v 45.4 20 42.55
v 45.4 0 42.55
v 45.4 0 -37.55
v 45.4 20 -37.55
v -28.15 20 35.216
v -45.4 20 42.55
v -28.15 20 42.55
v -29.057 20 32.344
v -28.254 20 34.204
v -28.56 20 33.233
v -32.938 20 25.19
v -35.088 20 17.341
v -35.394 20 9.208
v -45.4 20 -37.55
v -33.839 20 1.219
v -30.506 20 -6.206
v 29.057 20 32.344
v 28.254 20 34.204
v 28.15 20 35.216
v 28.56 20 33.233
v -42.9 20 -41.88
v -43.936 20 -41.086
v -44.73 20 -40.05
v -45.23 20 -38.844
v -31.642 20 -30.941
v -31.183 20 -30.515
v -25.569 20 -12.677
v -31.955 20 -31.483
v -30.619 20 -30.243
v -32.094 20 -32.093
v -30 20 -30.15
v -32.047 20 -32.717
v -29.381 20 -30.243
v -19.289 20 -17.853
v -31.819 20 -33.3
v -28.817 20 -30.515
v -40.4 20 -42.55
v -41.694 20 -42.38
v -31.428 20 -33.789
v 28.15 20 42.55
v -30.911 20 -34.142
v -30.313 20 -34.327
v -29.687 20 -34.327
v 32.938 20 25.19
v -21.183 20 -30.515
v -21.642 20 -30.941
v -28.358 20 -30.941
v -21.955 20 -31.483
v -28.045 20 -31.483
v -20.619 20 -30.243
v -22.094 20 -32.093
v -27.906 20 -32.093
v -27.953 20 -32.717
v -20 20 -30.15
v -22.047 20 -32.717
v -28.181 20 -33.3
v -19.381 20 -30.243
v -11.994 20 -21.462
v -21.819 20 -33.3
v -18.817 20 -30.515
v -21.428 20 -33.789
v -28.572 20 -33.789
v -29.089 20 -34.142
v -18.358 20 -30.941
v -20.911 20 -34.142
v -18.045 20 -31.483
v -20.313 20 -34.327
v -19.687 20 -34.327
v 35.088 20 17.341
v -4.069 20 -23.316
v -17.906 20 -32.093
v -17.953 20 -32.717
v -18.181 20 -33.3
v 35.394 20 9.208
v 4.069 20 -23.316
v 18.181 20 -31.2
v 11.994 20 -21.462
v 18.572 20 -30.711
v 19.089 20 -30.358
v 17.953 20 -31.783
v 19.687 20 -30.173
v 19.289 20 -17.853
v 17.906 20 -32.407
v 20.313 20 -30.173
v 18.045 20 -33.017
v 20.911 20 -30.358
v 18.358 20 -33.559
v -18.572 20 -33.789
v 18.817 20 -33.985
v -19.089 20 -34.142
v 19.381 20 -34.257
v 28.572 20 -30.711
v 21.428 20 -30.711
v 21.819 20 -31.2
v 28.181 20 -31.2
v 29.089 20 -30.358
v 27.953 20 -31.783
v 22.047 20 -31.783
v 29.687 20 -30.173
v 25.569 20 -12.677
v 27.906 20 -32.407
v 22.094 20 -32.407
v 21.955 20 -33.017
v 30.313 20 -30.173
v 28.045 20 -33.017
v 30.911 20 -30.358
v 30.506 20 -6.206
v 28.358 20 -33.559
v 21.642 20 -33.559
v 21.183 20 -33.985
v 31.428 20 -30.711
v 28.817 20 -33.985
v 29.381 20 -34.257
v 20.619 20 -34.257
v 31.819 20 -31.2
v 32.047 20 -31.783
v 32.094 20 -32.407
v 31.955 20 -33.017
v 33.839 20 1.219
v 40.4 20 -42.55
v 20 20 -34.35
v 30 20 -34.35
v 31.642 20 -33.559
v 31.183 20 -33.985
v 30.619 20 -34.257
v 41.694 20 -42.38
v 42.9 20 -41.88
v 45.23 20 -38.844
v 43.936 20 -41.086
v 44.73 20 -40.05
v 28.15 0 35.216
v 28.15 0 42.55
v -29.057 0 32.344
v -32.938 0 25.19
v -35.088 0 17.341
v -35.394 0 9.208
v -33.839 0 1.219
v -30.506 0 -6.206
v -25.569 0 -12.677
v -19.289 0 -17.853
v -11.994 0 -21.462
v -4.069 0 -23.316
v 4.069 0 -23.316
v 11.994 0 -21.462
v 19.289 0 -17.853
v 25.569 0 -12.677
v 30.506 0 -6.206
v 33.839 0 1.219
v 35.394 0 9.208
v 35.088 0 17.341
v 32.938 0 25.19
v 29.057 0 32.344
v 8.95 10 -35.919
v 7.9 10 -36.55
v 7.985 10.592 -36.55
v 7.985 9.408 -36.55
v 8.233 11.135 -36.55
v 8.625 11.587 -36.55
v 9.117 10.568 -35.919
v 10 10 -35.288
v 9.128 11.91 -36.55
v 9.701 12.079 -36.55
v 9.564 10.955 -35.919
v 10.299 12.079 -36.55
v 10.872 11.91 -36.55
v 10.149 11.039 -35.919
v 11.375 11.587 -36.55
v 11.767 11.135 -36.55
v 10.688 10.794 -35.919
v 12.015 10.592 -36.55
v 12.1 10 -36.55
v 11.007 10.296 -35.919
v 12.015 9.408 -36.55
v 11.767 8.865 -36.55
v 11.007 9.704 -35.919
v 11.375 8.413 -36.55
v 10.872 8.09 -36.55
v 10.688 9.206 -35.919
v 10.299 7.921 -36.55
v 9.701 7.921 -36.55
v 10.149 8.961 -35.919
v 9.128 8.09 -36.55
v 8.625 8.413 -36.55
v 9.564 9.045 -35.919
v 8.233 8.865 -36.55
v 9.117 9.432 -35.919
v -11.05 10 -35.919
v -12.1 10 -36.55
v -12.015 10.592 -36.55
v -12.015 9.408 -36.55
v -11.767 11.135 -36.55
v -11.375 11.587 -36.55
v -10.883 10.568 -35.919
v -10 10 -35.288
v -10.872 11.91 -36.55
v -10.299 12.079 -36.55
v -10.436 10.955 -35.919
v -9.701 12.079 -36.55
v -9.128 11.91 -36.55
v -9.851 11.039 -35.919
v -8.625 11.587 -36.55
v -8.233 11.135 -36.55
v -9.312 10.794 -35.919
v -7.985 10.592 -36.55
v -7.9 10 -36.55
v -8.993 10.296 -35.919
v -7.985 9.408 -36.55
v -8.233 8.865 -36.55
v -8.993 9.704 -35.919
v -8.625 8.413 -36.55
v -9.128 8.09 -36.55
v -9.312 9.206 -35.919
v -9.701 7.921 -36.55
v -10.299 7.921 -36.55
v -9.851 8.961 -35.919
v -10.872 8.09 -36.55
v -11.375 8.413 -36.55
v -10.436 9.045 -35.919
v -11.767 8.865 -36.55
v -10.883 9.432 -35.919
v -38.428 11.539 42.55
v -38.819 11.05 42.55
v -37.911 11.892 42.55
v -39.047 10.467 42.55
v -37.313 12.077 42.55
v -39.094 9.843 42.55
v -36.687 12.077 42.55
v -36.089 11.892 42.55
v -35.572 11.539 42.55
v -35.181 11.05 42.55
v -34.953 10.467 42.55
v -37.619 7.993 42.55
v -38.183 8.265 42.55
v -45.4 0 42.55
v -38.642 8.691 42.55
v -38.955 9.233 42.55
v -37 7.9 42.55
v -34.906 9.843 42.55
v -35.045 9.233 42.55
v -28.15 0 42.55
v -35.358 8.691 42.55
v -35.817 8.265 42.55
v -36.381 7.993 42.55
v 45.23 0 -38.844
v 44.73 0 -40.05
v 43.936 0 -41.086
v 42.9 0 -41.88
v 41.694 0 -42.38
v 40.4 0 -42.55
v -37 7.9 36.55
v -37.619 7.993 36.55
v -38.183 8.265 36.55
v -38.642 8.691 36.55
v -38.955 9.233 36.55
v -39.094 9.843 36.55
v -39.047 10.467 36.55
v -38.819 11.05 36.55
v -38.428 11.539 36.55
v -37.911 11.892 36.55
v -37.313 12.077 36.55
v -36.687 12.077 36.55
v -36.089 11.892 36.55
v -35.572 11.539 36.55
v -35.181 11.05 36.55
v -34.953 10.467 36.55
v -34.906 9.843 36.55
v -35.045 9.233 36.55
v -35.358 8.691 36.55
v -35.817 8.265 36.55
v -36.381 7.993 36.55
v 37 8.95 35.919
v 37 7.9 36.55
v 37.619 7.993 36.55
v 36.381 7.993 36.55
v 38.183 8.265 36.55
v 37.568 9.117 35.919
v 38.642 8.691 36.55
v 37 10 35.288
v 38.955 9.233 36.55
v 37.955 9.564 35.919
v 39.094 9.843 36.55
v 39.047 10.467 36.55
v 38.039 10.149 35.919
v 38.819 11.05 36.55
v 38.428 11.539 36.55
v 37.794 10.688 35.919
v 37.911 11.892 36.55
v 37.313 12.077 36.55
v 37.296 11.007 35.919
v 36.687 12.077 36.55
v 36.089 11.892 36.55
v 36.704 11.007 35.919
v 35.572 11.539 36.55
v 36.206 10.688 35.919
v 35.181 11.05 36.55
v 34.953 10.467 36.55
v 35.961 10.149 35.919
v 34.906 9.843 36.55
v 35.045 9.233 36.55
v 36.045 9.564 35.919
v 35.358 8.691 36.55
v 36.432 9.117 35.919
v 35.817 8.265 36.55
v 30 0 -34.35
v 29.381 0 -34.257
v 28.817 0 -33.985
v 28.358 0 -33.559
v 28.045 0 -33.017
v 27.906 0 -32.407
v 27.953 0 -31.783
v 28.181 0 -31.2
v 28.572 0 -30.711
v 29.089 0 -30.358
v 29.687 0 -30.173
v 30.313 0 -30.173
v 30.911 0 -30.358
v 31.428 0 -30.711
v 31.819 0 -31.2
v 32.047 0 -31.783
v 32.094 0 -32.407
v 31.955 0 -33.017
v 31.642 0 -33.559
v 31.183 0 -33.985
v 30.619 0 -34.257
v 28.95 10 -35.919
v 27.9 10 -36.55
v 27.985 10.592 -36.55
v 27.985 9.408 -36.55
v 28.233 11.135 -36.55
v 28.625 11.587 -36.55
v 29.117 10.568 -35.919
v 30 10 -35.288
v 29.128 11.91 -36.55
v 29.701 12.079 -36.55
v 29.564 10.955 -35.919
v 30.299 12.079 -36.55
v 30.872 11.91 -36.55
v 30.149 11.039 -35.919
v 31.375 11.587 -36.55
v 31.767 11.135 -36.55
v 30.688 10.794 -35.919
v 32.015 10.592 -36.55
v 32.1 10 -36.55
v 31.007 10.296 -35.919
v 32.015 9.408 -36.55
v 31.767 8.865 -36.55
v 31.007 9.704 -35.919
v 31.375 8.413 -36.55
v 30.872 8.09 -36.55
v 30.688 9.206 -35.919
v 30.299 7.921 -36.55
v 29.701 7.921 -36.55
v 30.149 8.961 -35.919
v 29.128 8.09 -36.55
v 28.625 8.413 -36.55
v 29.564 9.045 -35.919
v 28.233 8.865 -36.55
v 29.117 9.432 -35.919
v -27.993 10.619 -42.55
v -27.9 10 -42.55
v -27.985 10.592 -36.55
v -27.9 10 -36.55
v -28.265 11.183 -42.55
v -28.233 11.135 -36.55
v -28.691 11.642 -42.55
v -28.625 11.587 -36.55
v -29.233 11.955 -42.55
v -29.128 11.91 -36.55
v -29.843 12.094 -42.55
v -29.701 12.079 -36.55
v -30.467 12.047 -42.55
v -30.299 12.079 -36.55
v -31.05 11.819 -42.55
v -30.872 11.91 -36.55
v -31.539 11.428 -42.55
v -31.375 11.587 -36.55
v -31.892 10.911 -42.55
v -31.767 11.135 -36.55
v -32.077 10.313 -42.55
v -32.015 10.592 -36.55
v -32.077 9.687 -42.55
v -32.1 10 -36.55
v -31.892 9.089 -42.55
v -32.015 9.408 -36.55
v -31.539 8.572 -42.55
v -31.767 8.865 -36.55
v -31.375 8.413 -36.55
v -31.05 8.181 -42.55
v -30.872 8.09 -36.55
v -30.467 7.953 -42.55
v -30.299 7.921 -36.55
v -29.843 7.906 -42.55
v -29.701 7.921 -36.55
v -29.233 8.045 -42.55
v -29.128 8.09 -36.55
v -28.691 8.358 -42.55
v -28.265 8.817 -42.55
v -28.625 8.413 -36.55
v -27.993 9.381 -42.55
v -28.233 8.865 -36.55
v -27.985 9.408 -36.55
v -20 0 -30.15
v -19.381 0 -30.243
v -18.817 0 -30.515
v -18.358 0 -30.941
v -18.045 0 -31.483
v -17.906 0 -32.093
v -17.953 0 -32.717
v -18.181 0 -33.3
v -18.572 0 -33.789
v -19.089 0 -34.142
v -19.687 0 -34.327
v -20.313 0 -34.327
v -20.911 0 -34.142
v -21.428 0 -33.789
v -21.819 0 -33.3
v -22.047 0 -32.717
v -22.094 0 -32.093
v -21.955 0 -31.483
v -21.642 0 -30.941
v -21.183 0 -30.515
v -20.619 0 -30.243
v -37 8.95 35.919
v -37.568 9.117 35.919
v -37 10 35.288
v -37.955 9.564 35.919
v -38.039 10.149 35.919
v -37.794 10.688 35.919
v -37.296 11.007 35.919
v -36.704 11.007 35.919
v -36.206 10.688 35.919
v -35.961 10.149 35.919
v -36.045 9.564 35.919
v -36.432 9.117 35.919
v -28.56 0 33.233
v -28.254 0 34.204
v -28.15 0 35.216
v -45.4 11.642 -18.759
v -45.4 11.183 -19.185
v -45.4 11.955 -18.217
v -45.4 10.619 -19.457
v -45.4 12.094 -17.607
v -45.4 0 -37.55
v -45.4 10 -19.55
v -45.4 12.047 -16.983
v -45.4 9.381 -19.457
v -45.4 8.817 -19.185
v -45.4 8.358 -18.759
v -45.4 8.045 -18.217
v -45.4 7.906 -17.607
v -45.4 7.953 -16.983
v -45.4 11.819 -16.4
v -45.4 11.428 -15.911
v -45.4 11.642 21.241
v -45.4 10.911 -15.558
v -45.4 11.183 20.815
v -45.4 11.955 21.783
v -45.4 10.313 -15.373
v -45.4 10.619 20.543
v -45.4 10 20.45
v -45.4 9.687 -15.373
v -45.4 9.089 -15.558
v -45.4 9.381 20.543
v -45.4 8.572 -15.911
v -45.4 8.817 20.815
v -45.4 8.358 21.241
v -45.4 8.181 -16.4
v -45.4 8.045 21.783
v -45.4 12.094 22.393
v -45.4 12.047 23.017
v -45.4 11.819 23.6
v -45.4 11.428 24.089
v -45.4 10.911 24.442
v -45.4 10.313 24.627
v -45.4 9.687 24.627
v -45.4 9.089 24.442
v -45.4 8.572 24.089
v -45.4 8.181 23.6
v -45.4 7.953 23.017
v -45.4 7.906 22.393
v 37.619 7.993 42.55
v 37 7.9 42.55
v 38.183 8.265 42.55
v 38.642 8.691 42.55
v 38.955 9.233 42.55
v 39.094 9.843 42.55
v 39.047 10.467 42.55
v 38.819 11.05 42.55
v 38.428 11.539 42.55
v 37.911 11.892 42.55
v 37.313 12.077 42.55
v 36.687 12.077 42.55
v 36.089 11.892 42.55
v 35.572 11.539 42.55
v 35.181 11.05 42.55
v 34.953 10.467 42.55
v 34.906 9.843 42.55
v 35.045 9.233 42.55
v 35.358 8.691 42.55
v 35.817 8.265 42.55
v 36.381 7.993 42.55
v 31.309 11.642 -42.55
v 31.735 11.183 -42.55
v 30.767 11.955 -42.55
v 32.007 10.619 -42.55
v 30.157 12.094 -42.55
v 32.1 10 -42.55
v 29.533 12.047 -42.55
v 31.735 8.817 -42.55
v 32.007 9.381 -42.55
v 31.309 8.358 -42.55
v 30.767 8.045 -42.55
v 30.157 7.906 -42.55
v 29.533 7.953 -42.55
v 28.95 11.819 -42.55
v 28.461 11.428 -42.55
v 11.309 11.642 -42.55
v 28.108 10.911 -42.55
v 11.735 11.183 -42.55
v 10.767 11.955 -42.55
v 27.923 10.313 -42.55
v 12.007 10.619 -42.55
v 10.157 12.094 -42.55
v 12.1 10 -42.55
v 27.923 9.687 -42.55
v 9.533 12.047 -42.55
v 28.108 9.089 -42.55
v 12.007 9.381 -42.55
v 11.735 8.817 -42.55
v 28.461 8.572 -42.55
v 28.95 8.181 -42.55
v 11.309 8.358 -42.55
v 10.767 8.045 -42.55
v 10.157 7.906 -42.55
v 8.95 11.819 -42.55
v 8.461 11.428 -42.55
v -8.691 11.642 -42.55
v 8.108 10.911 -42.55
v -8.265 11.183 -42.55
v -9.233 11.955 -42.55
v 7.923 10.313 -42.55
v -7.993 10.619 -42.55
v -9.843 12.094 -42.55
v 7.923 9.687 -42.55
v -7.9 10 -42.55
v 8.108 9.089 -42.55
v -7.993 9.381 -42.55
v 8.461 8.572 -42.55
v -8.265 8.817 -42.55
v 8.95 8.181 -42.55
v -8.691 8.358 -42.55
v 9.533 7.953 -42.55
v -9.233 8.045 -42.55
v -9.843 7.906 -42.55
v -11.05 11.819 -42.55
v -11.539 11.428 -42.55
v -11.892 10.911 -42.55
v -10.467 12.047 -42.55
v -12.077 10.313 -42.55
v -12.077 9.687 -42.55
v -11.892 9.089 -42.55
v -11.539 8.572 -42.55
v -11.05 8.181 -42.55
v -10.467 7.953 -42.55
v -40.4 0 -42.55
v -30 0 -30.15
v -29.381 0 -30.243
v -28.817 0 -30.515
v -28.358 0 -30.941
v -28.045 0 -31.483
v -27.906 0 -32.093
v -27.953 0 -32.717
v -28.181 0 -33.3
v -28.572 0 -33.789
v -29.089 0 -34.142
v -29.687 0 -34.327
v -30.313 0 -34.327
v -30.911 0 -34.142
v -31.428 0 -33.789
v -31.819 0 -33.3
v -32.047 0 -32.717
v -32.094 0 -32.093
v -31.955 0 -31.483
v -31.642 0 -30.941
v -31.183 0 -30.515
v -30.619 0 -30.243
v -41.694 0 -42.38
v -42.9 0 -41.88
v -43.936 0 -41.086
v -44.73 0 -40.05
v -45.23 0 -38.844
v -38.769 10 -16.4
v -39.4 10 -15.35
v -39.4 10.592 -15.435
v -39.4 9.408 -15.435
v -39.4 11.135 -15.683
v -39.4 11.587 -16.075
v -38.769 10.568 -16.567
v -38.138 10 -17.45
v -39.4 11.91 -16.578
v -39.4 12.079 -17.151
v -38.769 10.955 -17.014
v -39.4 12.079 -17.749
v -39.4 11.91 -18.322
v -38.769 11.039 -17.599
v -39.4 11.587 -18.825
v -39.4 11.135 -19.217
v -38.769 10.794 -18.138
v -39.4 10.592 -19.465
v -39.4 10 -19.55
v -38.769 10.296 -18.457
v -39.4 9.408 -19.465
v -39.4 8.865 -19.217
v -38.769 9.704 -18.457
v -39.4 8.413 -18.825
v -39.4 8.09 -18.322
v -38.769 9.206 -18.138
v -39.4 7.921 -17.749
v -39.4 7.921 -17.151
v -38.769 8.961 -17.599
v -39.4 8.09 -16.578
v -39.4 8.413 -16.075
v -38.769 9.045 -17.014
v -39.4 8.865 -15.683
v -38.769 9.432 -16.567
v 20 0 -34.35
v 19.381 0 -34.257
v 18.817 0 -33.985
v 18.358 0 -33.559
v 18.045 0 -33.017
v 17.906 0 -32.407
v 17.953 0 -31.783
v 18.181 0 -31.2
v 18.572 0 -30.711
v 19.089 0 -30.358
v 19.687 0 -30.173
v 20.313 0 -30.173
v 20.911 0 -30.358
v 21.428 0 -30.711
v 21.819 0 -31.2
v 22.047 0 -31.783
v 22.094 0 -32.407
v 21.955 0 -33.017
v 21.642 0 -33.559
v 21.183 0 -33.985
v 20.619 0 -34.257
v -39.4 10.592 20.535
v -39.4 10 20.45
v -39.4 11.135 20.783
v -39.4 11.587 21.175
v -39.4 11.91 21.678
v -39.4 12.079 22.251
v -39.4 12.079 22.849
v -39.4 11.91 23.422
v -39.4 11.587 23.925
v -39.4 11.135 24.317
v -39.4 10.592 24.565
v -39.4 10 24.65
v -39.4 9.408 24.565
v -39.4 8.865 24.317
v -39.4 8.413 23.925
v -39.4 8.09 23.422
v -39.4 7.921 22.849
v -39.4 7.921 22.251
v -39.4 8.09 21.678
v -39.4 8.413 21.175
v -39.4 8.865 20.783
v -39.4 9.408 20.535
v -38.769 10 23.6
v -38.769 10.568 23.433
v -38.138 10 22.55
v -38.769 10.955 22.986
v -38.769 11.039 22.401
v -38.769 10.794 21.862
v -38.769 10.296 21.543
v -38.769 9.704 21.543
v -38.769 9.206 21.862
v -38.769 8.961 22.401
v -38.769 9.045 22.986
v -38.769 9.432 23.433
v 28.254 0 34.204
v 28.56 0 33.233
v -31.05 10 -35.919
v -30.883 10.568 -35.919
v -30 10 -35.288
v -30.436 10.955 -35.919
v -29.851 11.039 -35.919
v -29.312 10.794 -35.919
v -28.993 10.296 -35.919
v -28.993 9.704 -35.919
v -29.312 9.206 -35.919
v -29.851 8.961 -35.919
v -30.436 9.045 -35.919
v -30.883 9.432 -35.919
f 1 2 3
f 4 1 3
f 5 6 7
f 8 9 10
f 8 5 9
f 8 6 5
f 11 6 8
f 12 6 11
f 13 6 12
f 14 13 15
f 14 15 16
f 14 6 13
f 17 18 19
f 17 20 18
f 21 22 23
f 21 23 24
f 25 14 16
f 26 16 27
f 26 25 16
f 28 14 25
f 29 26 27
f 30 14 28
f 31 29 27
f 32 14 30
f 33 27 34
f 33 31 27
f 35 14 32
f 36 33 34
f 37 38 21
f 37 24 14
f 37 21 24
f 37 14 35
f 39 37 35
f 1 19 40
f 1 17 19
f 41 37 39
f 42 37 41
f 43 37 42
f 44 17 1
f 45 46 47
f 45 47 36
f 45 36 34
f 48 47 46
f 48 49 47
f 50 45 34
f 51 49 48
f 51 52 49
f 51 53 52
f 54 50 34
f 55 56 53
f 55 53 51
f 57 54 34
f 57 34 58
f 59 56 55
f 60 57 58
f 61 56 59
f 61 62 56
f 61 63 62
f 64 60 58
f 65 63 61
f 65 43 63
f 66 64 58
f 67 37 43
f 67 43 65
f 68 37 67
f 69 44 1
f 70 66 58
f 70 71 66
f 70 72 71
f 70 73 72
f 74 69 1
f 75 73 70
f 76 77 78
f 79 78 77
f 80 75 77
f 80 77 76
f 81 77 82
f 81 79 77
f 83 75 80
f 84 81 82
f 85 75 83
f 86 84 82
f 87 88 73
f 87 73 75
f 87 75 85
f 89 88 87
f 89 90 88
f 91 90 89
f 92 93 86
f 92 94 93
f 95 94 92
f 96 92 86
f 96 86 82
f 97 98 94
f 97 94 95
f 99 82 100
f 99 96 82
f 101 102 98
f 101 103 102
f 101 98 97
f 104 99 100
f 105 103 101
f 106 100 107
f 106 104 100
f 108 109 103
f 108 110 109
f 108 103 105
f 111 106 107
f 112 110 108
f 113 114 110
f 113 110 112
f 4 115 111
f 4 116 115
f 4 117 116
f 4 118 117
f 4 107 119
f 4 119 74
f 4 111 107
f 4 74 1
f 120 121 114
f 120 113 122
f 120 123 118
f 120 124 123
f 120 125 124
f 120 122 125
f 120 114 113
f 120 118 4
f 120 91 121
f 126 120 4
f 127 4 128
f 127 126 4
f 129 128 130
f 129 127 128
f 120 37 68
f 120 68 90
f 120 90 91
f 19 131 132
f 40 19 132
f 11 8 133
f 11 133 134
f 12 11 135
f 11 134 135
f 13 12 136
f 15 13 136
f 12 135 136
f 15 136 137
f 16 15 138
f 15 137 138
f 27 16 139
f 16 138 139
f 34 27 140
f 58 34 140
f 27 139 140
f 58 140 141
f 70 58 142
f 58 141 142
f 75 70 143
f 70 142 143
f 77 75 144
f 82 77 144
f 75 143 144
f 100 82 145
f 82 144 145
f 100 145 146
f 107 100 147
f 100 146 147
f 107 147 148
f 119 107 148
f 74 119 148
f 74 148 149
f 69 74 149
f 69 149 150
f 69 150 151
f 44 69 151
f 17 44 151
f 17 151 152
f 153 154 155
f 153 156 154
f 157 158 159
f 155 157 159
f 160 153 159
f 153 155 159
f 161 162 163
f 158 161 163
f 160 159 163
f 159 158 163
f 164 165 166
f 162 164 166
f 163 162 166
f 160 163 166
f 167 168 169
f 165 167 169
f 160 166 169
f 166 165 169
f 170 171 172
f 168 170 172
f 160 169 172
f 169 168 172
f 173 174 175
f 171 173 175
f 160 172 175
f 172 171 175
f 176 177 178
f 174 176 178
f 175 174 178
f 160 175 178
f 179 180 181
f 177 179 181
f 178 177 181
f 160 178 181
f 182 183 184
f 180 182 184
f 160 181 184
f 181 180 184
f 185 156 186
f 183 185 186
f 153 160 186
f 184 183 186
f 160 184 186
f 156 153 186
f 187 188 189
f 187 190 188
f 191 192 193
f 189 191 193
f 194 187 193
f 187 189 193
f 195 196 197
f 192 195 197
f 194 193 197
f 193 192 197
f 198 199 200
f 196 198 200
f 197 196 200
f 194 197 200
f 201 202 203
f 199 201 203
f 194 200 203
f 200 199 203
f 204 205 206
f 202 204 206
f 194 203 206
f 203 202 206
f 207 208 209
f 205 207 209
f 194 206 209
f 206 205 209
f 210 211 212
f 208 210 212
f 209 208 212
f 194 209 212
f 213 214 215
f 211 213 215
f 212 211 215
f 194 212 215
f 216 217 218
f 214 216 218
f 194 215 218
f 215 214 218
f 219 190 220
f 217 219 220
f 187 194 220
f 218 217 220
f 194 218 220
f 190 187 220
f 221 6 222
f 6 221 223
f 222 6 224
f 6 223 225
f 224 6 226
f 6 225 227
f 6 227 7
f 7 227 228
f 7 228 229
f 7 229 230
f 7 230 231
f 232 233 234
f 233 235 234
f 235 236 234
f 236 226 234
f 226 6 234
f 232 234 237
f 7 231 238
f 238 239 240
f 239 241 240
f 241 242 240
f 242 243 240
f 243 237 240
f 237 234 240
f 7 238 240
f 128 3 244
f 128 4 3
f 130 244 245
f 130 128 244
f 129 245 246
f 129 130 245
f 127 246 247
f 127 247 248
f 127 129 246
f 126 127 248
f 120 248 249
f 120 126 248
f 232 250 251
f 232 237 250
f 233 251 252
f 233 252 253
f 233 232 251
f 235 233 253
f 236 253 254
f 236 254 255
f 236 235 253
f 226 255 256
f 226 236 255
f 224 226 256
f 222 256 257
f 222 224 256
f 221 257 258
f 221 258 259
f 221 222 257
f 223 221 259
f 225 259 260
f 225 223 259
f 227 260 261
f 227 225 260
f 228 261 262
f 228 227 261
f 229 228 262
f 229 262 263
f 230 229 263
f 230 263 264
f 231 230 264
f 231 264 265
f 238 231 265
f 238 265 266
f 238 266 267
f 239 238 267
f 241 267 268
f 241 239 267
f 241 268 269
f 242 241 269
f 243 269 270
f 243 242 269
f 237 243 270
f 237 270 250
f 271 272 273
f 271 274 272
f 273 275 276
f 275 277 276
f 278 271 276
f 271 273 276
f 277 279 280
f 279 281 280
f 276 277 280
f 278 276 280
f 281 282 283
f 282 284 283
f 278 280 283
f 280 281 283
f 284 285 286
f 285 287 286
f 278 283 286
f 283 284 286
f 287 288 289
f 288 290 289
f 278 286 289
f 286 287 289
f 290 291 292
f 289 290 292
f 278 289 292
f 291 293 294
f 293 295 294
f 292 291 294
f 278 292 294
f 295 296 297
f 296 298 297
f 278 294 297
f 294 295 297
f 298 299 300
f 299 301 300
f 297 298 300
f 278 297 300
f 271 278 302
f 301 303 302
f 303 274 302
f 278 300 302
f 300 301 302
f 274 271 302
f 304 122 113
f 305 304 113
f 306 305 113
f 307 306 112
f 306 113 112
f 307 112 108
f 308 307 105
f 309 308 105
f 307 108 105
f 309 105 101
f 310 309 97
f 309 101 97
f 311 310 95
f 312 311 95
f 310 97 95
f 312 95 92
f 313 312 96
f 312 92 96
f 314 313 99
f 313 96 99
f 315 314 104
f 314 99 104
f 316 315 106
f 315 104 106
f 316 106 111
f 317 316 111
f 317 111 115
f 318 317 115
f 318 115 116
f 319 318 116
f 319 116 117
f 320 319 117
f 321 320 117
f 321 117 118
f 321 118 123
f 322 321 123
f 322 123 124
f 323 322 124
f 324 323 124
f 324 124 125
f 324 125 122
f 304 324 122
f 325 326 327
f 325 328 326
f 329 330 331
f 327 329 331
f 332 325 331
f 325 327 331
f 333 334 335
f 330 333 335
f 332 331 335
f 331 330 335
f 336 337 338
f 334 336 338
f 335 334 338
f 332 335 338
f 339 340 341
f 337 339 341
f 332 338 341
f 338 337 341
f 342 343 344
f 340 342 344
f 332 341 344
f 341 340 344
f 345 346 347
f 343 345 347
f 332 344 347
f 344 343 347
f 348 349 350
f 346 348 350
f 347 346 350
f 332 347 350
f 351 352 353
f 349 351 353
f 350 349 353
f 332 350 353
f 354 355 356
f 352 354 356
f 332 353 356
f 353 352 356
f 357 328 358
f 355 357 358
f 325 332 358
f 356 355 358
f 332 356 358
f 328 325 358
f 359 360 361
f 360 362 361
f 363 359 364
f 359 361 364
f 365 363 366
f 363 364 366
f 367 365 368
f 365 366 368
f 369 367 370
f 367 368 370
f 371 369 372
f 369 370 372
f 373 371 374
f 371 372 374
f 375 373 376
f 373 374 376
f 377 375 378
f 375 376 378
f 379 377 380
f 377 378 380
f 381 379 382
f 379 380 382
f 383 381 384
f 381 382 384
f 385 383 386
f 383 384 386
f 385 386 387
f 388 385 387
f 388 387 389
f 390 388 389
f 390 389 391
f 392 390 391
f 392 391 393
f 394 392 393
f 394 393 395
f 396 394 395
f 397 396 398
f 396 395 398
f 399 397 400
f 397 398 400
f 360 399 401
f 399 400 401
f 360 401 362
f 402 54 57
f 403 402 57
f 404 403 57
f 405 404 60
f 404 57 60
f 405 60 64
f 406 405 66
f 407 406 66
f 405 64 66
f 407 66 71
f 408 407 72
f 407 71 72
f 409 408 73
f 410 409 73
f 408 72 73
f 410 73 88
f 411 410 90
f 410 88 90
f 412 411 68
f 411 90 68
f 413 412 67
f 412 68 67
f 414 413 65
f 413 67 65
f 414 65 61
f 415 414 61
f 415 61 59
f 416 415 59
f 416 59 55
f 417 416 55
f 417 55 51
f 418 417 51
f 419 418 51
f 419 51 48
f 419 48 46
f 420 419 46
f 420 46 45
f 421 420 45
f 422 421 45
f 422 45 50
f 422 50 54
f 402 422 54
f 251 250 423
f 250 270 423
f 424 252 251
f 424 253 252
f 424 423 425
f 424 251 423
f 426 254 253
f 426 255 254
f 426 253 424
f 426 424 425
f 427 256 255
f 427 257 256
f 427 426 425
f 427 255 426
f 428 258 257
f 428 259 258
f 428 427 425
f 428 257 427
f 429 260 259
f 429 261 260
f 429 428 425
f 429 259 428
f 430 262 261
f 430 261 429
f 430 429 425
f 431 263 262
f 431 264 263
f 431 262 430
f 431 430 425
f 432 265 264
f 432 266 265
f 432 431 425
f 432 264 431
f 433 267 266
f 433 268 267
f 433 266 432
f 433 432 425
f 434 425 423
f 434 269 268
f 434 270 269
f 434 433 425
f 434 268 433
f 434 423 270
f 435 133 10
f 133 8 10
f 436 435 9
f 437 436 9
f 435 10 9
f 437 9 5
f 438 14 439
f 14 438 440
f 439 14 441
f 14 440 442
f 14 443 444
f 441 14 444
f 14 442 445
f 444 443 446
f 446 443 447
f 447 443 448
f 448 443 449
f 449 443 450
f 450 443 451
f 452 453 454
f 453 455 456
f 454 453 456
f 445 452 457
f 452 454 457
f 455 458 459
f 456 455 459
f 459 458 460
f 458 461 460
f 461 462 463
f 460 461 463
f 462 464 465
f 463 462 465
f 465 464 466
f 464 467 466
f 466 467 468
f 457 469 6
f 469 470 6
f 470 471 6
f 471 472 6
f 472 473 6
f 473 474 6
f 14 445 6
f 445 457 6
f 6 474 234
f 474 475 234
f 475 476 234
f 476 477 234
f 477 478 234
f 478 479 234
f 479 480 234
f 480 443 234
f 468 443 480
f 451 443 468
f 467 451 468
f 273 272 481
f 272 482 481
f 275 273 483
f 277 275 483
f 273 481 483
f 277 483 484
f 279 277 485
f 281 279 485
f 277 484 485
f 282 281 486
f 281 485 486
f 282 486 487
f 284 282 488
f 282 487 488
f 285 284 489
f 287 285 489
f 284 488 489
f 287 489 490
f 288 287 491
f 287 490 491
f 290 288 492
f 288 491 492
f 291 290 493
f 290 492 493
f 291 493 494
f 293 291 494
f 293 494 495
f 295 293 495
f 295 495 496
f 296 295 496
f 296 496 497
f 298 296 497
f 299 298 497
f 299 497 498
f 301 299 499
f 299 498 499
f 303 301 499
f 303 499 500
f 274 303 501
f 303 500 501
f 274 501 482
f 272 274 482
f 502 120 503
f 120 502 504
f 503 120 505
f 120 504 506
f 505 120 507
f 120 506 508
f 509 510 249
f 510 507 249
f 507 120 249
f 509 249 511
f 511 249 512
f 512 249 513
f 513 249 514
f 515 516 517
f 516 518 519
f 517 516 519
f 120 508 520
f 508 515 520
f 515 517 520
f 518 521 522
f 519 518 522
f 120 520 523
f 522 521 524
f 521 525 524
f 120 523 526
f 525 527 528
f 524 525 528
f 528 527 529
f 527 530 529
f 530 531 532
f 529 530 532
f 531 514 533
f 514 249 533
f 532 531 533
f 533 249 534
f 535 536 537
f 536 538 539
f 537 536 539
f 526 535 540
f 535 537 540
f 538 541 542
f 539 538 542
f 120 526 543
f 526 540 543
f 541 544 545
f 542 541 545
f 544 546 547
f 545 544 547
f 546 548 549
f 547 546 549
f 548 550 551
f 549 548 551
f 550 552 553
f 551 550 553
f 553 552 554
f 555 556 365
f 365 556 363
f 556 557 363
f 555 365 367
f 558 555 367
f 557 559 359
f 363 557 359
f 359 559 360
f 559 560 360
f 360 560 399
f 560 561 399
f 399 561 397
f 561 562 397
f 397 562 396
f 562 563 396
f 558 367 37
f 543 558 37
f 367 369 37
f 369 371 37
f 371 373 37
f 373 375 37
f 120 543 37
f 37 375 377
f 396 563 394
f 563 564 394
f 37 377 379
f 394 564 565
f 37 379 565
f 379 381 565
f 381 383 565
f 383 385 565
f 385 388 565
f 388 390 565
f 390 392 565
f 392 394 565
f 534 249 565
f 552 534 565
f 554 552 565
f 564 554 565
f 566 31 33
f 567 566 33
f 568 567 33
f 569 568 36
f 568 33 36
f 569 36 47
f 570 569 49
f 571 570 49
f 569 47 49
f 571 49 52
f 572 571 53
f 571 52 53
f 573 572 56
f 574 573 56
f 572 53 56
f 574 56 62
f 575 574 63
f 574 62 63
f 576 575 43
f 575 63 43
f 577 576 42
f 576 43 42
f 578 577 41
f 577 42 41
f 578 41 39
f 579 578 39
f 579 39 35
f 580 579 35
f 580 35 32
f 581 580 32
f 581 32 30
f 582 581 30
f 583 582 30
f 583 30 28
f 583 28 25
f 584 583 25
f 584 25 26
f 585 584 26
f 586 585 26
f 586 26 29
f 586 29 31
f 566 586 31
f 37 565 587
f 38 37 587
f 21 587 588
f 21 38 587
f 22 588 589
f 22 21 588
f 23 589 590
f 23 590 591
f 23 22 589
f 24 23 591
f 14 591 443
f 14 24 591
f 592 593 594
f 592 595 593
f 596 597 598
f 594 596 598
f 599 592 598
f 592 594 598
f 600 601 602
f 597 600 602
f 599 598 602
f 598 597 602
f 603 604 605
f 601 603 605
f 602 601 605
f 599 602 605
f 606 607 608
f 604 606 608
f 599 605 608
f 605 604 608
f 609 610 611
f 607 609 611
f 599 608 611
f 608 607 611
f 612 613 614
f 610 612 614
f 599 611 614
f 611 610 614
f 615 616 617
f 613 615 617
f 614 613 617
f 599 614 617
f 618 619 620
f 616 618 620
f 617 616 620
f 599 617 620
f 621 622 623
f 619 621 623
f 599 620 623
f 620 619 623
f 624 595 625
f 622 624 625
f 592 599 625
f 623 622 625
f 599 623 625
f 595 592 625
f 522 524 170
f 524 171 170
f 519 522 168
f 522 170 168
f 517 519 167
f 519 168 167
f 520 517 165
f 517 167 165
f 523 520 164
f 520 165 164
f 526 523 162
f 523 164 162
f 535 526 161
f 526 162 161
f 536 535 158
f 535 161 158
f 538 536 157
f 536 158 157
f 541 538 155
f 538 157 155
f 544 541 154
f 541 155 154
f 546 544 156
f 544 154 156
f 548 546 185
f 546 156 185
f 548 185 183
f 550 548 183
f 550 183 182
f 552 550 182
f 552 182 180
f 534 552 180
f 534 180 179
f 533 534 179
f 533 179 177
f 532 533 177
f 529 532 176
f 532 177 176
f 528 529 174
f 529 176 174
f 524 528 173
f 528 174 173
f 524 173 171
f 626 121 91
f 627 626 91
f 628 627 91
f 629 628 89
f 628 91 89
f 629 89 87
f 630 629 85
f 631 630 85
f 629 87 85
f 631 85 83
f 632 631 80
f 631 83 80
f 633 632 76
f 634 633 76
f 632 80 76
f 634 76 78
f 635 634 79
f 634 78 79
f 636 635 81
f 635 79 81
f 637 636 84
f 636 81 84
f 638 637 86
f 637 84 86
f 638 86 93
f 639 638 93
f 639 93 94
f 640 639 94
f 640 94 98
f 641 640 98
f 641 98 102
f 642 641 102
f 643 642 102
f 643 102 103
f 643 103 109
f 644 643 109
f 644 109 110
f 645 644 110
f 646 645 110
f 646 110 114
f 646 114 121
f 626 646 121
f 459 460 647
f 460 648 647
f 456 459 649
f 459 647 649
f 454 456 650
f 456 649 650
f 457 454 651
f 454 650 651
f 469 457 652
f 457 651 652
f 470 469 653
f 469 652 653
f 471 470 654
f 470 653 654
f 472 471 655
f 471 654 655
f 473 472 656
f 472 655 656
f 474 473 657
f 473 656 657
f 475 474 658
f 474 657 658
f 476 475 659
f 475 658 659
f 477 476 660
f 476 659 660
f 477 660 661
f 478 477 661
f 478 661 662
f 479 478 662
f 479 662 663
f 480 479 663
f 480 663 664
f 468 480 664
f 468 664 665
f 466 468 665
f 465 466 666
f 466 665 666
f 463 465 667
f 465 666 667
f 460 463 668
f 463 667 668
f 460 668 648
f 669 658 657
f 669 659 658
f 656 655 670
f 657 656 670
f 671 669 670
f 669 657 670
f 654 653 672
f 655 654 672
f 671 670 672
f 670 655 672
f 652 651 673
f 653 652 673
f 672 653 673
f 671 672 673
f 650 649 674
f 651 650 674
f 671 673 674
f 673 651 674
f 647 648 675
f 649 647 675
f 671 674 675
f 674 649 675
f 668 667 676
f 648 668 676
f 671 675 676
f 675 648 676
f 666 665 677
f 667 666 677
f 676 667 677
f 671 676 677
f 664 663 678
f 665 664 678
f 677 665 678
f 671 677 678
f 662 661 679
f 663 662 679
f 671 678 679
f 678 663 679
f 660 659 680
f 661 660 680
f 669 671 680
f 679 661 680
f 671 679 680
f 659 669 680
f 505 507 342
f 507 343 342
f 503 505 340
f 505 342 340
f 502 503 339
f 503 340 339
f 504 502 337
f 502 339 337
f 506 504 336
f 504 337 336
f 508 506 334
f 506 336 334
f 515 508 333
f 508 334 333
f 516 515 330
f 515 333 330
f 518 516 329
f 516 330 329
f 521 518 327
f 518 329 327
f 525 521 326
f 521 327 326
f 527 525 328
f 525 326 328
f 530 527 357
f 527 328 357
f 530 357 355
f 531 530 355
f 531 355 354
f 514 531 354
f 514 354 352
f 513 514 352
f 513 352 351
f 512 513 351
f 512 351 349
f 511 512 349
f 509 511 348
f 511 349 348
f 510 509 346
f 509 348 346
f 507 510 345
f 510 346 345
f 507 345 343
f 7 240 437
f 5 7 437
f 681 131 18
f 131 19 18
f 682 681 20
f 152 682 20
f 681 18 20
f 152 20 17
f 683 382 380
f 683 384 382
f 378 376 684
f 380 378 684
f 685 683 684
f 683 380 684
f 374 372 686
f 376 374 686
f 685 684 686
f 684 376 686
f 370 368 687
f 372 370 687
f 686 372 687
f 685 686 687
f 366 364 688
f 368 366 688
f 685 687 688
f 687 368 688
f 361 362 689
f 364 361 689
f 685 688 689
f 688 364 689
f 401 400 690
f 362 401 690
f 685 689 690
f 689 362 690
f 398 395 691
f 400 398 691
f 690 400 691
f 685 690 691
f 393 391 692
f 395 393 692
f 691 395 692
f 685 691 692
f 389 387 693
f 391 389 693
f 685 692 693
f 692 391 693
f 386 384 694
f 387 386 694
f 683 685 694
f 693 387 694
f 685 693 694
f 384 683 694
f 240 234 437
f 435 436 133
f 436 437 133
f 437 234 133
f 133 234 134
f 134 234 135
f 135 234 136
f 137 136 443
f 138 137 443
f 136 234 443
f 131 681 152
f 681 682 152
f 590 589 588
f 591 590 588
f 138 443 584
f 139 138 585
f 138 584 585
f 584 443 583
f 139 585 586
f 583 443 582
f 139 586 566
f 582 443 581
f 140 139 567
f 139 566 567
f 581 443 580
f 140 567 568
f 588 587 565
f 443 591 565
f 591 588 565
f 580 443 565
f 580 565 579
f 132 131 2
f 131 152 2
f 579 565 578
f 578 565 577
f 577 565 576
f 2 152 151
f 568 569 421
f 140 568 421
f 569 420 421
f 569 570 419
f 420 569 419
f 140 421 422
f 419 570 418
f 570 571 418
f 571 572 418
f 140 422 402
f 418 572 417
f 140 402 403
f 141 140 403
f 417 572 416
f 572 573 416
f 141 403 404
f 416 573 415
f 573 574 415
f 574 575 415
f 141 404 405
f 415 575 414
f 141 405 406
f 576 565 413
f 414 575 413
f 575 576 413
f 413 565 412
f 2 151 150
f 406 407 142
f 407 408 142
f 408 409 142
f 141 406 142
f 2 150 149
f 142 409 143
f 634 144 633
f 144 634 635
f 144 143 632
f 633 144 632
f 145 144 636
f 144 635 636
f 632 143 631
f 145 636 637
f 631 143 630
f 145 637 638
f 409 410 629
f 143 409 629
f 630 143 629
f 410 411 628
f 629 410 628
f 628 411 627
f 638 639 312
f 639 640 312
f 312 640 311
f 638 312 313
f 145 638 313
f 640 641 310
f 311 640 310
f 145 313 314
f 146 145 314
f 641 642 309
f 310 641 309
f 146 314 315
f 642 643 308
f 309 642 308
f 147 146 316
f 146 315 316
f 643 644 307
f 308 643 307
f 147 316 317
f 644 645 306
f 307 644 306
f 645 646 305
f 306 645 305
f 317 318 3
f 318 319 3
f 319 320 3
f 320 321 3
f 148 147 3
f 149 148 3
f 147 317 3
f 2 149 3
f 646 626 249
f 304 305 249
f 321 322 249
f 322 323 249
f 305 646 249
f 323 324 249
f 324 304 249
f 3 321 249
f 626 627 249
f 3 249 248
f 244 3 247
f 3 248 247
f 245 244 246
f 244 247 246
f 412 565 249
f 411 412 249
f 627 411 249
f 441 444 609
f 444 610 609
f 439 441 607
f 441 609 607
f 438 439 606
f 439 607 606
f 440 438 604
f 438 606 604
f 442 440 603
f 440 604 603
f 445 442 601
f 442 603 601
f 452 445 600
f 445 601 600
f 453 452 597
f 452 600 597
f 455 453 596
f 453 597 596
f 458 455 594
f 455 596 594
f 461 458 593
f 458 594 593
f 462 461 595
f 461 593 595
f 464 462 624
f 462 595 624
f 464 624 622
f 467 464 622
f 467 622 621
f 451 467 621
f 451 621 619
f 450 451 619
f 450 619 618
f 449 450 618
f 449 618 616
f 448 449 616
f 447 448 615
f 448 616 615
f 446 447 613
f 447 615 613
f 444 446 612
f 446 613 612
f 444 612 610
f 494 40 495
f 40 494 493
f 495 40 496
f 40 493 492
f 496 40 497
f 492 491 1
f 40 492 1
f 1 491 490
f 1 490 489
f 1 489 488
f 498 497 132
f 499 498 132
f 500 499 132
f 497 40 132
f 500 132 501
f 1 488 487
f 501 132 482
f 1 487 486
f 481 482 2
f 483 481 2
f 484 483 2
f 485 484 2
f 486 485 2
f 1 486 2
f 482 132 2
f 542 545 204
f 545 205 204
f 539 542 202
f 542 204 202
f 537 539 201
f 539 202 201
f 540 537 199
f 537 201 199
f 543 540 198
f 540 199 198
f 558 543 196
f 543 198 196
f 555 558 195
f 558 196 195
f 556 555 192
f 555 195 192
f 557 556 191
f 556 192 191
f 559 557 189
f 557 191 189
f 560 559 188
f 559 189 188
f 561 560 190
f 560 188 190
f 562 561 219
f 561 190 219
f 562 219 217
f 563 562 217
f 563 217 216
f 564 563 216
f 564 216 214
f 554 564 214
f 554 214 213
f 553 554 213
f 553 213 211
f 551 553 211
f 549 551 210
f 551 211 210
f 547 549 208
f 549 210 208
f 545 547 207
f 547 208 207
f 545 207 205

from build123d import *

# Parameters (mm, degrees)
BOSS_EXTRUDE1_DEPTH            = 20
SKETCH3_R                      = 2.1
CUT_EXTRUDE1_DEPTH             = 66.357956669
F_4_2_4_2_DIAMETER_HOLE1_D     = 4.2
F_4_2_4_2_DIAMETER_HOLE1_DEPTH = 6
F_4_2_4_2_DIAMETER_HOLE1_TIP   = 1.2618073
F_4_2_4_2_DIAMETER_HOLE4_D     = 4.2
F_4_2_4_2_DIAMETER_HOLE4_DEPTH = 6
F_4_2_4_2_DIAMETER_HOLE4_TIP   = 1.2618073
FILLET2_R                      = 5


with BuildPart() as part:
    # Sketch1 → Boss-Extrude1 (new body)
    with BuildSketch(Plane(origin=(0, 0, 0), x_dir=(1, 0, 0), z_dir=(0, 1, 0))):
        with BuildLine():
            Line((28.15, -42.55), (45.4, -42.55))
            Line((45.4, -42.55), (45.4, 42.55))
            Line((45.4, 42.55), (-45.4, 42.55))
            Line((-45.4, 42.55), (-45.4, -42.55))
            Line((-45.4, -42.55), (-28.15, -42.55))
            Line((-28.15, -42.55), (-28.15, -33.579320378))
            ThreePointArc((-28.15, -33.579320378), (0, 23.55), (28.15, -33.579320378))
            Line((28.15, -33.579320378), (28.15, -42.55))
        make_face()
    extrude(amount=BOSS_EXTRUDE1_DEPTH)

    # Sketch3 → Cut-Extrude1 (cut, through all)
    with BuildSketch(Plane(origin=(0, 20, 0), x_dir=(1, 0, 0), z_dir=(0, 1, 0))):
        with Locations(Location((-30, 32.25, 0), (0, 0, 270))):
            Circle(SKETCH3_R)
        with Locations(Location((-20, 32.25, 0), (0, 0, 270))):
            Circle(SKETCH3_R)
        with Locations(Location((20, 32.25, 0), (0, 0, 90))):
            Circle(SKETCH3_R)
        with Locations(Location((30, 32.25, 0), (0, 0, 90))):
            Circle(SKETCH3_R)
    extrude(amount=-CUT_EXTRUDE1_DEPTH, mode=Mode.SUBTRACT)

    # Ø4.2 (4.2) Diameter Hole1
    with Locations(Plane(origin=(0, 0, -42.55), x_dir=(-1, 0, 0), z_dir=(0, 0, -1))):
        with Locations((-30, 10), (-10, 10), (10, 10), (30, 10)):
            Hole(F_4_2_4_2_DIAMETER_HOLE1_D / 2, depth=F_4_2_4_2_DIAMETER_HOLE1_DEPTH)
            with Locations((0, 0, -(F_4_2_4_2_DIAMETER_HOLE1_DEPTH + F_4_2_4_2_DIAMETER_HOLE1_TIP / 2))):  # 118° drill point
                Cone(0, F_4_2_4_2_DIAMETER_HOLE1_D / 2, F_4_2_4_2_DIAMETER_HOLE1_TIP, mode=Mode.SUBTRACT)

    # Ø4.2 (4.2) Diameter Hole4
    with Locations(Plane.ZY.offset(45.4)):
        with Locations((-17.45, 10), (22.55, 10)):
            Hole(F_4_2_4_2_DIAMETER_HOLE4_D / 2, depth=F_4_2_4_2_DIAMETER_HOLE4_DEPTH)
            with Locations((0, 0, -(F_4_2_4_2_DIAMETER_HOLE4_DEPTH + F_4_2_4_2_DIAMETER_HOLE4_TIP / 2))):  # 118° drill point
                Cone(0, F_4_2_4_2_DIAMETER_HOLE4_D / 2, F_4_2_4_2_DIAMETER_HOLE4_TIP, mode=Mode.SUBTRACT)

    # Sketch20 → Ø4.2 (4.2) Diameter Hole6 (revolve, cut)
    with BuildSketch(Plane(origin=(-37, 10, 42.55), x_dir=(0, -1, 0), z_dir=(1, 0, 0))):
        Polygon((0, 0), (0, 7.2618073), (2.1, 6), (2.1, 0), align=None)
    f_4_2_4_2_diameter_hole6 = revolve(axis=Axis((-37, 10, 48.9), (0, 0, -1)), mode=Mode.SUBTRACT)

    # Mirror2: Ø4.2 (4.2) Diameter Hole6 across plane
    add(f_4_2_4_2_diameter_hole6.mirror(Plane(origin=(0, 0, 0), x_dir=(0, 0, 1), z_dir=(1, 0, 0))), mode=Mode.SUBTRACT)

    # Fillet2
    fillet2_edges = [part.edges().sort_by_distance(p)[0] for p in [
        (28.15, 10, 33.579320378),
        (-28.15, 10, 33.579320378),
        (-45.4, 10, -42.55),
        (45.4, 10, -42.55),
    ]]
    fillet(fillet2_edges, radius=FILLET2_R)


solid = part.part
